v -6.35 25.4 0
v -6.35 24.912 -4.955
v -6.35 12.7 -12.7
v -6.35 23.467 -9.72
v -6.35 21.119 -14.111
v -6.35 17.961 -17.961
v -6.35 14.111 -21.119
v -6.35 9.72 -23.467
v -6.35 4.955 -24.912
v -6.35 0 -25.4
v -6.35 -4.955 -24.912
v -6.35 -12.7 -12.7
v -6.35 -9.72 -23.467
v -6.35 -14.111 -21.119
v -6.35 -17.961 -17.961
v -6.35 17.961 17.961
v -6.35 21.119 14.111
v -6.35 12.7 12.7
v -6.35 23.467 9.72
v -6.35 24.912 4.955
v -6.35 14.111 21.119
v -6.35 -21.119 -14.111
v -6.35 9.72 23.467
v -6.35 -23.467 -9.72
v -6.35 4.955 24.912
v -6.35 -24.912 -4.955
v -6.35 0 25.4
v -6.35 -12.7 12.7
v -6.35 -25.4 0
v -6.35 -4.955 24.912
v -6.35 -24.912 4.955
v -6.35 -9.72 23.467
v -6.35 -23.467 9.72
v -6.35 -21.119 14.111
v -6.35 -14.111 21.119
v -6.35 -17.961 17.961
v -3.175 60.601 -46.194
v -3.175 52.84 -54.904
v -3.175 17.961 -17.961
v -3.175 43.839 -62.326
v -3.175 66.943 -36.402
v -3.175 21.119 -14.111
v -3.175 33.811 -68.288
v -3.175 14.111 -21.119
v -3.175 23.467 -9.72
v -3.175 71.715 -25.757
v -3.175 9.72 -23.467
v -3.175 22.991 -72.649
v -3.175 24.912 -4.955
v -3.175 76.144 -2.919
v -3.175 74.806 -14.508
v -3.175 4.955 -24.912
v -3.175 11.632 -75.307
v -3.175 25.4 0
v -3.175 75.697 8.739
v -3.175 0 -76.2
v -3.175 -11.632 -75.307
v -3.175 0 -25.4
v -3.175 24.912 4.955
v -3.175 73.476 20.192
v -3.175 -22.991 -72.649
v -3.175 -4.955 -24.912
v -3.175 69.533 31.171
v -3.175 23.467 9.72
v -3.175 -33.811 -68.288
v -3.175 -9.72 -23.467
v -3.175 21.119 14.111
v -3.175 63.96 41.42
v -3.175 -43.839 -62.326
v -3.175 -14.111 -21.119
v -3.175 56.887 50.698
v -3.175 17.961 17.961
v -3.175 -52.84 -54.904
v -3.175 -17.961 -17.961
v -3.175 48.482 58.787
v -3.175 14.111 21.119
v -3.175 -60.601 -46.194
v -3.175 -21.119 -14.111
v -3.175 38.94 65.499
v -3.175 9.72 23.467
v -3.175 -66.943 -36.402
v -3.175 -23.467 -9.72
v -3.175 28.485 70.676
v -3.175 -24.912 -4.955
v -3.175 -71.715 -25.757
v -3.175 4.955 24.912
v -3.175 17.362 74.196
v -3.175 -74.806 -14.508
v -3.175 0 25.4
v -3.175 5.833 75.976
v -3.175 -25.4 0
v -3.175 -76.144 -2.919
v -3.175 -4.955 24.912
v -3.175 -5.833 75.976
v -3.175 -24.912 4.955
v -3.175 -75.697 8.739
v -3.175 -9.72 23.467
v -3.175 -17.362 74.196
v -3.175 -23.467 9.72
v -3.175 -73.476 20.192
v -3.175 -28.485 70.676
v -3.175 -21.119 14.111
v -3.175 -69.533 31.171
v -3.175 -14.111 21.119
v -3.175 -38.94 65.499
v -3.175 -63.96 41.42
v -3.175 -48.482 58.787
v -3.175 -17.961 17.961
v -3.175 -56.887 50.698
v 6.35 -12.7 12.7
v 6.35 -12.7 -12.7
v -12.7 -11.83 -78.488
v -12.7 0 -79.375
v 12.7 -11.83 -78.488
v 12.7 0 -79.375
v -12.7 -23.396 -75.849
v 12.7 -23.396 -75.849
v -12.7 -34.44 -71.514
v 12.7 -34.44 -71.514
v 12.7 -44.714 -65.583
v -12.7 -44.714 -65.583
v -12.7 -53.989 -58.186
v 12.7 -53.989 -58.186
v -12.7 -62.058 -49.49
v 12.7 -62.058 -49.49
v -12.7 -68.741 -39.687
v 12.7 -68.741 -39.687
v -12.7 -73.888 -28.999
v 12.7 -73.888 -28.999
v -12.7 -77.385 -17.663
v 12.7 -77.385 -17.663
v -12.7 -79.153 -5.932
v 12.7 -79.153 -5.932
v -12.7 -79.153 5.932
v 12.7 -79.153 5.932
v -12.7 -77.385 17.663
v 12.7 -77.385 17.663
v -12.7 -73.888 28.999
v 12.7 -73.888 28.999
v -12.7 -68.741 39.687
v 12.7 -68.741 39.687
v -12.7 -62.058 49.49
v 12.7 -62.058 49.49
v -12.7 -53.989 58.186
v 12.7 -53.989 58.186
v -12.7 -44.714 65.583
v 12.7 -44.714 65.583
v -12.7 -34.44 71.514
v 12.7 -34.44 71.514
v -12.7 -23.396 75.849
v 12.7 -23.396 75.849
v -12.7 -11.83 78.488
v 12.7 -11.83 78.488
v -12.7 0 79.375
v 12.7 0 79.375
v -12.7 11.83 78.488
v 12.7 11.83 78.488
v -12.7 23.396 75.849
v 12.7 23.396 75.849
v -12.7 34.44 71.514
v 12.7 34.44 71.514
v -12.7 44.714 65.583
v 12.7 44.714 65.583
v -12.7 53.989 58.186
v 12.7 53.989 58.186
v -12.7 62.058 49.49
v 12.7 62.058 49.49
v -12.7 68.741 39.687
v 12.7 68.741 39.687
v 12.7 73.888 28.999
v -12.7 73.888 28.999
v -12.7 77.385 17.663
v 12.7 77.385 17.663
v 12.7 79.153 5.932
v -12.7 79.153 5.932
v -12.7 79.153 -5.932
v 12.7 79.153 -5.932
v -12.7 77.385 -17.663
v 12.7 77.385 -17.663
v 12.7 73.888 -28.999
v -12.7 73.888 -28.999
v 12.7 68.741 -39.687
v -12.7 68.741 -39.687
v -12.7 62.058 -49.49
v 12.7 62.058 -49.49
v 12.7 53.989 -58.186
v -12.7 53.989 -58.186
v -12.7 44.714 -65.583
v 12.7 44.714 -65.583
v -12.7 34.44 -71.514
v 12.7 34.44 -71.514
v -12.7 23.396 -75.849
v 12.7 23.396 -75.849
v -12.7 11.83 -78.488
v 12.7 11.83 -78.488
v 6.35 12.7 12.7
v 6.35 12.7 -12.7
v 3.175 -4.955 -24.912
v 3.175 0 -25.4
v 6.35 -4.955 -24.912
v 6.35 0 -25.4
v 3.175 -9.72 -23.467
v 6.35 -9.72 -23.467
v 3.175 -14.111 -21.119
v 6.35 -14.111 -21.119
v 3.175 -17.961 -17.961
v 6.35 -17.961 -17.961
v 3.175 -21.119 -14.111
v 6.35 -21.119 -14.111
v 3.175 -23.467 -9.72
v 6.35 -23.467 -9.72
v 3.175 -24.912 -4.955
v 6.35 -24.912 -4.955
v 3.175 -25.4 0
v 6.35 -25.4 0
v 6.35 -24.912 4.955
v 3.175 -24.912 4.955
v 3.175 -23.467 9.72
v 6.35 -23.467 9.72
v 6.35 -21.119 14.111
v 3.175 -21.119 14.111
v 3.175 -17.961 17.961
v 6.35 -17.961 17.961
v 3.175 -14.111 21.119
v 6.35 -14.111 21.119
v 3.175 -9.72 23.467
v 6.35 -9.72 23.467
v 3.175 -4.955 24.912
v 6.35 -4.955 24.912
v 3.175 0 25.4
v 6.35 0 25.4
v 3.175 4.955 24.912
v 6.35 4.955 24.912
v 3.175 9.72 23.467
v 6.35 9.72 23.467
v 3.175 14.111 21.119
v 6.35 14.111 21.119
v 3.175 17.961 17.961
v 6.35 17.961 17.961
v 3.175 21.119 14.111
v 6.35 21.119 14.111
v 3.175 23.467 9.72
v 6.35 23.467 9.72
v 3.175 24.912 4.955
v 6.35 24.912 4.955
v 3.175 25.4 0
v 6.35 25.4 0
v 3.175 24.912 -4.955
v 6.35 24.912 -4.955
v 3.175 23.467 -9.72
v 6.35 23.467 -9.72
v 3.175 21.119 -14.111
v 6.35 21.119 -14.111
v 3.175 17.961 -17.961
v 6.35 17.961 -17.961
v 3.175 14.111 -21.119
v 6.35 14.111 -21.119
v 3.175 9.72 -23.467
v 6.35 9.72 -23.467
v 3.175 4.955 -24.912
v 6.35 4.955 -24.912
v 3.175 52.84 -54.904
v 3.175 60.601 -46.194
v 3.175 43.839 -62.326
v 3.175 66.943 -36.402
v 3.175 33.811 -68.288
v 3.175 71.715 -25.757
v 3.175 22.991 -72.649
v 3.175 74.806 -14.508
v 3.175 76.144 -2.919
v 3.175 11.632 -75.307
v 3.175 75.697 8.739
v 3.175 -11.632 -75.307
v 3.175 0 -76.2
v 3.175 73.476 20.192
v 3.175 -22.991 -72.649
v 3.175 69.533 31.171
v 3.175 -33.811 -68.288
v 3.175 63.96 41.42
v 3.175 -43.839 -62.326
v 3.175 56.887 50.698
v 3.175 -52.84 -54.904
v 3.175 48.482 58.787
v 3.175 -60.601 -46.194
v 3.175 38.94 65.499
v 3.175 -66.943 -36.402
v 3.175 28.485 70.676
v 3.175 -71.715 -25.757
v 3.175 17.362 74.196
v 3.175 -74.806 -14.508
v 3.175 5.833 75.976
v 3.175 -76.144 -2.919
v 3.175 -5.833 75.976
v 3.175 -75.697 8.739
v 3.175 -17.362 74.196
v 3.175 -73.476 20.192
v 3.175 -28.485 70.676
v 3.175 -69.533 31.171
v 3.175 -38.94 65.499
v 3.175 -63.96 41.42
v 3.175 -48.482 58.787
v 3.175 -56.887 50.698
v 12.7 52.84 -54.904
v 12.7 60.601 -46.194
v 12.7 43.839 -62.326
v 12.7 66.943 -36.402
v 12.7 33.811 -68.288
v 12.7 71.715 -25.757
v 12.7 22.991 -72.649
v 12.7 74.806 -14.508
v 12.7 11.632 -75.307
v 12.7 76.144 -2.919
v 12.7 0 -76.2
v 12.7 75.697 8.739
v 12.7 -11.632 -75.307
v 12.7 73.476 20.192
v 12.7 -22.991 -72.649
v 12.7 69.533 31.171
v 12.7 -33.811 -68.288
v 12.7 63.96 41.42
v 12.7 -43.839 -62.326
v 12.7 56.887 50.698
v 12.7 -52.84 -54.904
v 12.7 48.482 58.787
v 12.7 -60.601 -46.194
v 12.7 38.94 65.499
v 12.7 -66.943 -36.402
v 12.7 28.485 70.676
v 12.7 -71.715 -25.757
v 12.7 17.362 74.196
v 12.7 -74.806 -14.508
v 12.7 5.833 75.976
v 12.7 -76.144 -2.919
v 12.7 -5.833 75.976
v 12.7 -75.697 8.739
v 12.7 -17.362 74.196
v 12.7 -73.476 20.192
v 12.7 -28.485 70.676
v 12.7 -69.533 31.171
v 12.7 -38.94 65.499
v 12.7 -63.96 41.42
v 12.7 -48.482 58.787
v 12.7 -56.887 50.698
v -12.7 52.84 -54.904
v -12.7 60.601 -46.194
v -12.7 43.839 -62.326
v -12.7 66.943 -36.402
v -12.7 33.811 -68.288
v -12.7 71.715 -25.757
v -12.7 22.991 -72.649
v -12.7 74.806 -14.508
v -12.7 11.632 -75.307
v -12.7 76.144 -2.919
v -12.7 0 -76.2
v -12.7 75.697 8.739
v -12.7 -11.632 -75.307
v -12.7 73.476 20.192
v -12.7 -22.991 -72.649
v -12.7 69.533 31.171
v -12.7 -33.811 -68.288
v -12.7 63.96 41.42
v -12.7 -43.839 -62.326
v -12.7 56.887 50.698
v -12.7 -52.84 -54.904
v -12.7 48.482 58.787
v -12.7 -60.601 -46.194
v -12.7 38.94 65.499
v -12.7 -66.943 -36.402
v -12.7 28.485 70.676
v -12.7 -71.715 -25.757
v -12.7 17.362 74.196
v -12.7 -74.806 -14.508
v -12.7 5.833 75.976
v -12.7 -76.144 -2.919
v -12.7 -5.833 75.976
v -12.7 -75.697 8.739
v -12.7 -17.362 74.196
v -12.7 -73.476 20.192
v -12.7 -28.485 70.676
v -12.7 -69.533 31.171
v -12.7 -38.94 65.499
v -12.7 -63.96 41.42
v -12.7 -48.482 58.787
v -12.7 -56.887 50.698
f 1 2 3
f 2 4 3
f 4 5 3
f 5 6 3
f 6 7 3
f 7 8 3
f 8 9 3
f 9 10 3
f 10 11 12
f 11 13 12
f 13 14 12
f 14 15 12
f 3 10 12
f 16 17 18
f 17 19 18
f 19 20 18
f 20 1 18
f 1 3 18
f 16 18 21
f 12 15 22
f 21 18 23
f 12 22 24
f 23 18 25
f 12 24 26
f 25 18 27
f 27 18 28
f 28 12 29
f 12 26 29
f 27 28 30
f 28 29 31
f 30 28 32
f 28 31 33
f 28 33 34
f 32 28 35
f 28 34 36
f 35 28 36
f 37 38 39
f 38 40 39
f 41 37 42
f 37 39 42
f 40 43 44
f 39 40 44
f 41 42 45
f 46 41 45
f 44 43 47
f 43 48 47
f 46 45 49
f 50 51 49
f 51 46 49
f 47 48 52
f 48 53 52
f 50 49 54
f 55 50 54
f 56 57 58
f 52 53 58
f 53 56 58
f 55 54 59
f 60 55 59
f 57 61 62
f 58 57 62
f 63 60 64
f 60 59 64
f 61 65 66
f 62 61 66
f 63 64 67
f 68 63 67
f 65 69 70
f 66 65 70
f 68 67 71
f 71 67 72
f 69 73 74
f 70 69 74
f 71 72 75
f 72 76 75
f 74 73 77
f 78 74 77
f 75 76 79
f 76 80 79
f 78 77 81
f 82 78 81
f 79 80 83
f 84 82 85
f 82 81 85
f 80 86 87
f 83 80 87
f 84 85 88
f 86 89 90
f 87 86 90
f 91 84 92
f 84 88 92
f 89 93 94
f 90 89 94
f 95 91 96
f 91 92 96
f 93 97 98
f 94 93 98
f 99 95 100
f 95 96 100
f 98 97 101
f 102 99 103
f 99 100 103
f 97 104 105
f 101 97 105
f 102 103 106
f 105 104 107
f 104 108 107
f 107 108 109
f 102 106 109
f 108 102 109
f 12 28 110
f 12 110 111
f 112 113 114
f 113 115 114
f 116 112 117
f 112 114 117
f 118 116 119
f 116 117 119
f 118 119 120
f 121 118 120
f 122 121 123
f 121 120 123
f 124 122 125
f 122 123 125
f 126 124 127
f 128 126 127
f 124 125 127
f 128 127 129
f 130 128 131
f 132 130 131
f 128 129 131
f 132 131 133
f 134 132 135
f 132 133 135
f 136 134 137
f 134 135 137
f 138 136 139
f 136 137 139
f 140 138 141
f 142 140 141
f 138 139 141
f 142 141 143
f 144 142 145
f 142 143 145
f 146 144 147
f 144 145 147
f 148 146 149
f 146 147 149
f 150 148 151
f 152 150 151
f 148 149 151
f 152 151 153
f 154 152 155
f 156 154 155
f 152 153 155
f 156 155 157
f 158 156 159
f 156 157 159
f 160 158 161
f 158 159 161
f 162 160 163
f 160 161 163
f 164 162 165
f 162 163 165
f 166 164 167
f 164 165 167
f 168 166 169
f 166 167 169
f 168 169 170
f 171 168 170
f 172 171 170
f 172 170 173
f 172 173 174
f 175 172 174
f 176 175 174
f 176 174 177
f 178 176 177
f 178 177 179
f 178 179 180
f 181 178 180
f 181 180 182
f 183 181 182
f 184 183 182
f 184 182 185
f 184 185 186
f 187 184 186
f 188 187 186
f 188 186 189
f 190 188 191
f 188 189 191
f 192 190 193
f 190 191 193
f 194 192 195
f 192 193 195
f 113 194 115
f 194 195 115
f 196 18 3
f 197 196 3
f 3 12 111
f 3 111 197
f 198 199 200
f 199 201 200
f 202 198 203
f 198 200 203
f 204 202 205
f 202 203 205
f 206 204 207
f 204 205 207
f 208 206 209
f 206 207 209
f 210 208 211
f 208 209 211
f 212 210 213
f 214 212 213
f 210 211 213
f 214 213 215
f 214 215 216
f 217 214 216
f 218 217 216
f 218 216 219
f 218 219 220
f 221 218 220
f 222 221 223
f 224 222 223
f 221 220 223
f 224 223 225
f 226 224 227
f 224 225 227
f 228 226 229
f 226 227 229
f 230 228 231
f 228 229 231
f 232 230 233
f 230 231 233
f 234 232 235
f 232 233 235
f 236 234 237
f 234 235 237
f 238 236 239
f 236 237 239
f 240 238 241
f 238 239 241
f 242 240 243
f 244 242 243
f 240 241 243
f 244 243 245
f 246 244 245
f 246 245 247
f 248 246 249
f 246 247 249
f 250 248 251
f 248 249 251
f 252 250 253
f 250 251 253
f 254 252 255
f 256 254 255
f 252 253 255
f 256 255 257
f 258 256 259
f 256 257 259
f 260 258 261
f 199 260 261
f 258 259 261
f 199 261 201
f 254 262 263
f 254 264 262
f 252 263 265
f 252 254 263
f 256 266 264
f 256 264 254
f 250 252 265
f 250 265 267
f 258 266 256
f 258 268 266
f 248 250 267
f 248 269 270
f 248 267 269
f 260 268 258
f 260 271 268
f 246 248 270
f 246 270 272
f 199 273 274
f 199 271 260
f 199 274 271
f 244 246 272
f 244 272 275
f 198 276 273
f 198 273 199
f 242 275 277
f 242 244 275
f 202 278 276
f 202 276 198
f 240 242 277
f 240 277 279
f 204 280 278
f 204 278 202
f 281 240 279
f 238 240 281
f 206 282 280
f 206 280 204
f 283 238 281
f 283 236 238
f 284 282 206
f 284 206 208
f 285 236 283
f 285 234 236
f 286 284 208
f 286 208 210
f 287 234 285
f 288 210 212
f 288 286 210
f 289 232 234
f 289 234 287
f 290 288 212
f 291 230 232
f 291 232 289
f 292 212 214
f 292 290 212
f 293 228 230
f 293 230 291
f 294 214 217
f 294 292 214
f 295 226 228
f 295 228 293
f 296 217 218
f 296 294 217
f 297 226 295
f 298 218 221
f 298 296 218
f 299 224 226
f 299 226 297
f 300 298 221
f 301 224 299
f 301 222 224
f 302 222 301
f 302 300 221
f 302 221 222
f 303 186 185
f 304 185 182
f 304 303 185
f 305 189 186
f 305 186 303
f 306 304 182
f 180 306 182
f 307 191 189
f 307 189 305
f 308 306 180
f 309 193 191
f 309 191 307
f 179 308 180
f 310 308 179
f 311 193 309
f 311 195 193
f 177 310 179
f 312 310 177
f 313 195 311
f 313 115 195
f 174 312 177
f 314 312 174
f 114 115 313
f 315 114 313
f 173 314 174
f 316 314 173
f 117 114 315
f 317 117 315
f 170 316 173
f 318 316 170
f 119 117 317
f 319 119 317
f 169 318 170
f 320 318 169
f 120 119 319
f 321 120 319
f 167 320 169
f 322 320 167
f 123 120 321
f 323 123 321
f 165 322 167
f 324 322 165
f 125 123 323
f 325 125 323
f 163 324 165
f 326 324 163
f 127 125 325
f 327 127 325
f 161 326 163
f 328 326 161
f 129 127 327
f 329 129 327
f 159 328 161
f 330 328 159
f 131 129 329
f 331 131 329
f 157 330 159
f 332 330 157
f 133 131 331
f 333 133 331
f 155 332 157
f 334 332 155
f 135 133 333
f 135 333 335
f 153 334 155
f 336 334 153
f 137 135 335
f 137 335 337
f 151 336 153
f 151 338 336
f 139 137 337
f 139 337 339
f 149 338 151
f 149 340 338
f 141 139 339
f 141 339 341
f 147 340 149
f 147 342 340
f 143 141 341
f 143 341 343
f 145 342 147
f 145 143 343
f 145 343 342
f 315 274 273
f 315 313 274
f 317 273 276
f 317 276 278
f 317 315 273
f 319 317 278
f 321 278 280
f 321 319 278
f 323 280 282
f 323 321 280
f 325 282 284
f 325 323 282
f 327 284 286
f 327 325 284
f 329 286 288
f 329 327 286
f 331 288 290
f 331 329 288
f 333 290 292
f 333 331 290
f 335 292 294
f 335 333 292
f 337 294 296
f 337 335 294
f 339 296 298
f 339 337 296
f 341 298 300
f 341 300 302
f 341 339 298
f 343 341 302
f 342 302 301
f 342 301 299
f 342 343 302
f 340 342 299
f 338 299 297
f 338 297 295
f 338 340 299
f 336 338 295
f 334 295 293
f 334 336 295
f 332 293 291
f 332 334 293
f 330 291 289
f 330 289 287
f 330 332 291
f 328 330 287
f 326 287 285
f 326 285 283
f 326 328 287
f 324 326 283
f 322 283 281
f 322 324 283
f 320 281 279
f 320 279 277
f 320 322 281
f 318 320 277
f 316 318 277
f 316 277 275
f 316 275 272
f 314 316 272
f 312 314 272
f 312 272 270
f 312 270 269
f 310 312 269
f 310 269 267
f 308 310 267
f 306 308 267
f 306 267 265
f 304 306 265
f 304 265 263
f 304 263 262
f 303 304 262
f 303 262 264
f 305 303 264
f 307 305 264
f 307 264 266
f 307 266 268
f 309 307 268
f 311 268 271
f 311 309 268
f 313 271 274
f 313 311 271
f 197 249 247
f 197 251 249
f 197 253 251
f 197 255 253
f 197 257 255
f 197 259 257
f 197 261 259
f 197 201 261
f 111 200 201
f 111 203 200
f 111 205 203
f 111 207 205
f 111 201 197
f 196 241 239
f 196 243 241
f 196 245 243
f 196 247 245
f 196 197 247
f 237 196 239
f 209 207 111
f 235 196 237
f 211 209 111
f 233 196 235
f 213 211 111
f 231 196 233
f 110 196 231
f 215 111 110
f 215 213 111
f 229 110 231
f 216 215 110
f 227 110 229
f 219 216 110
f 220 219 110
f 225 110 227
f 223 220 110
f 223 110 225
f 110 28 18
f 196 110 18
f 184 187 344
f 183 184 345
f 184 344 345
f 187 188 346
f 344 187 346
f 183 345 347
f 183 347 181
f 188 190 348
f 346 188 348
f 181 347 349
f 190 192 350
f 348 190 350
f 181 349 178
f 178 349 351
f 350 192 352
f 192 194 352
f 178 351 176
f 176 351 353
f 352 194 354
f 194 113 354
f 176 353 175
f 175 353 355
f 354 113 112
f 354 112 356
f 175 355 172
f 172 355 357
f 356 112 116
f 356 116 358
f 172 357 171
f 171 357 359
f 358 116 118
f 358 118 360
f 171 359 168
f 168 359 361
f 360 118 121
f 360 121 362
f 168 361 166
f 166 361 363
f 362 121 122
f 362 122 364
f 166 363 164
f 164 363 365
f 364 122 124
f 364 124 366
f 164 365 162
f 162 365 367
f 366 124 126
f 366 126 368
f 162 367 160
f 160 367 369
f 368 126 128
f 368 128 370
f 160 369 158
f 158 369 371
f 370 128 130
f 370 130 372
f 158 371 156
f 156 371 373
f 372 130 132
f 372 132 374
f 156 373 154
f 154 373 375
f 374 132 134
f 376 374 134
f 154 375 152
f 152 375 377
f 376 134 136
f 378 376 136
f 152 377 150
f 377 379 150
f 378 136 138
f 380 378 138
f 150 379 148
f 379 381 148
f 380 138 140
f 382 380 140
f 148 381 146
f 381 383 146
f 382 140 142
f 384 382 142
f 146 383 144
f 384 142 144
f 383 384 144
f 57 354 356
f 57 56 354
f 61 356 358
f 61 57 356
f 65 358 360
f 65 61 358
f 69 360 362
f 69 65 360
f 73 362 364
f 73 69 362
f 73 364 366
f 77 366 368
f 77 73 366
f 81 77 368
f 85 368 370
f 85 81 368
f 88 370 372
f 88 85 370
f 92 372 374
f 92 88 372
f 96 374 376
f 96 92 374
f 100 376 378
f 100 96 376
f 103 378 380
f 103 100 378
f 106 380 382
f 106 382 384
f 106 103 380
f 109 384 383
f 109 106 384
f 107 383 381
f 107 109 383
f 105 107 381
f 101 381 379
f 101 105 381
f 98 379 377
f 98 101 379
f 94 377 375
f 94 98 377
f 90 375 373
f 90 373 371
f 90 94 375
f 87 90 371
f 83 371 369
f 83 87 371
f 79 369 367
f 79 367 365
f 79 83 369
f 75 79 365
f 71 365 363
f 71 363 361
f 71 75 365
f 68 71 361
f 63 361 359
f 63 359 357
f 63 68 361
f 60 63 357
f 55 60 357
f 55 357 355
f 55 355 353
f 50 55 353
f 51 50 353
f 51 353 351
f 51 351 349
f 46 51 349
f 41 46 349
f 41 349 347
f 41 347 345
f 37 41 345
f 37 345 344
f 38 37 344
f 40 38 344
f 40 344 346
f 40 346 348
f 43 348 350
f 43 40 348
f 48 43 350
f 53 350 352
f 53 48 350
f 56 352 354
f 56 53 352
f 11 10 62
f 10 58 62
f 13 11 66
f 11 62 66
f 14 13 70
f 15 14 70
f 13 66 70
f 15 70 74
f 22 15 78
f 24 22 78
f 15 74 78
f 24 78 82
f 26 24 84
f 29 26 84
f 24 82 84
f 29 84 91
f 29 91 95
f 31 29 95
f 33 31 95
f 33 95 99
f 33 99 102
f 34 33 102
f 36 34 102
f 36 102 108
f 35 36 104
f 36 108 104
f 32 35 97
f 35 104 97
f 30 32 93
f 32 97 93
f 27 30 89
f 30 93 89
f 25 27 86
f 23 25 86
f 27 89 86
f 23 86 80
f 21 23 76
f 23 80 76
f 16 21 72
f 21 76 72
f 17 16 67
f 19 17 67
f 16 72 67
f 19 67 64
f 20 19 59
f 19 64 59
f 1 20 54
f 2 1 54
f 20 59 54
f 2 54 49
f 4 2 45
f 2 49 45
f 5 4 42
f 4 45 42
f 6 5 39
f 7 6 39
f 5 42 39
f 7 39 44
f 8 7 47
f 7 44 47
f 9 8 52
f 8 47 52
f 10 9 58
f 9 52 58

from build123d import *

# Parameters (mm, degrees)
SKETCH1_W               = 6.35
SKETCH1_H               = 50.8
SKETCH1_W_2             = 12.7
SKETCH1_H_2             = 25.4
SKETCH1_W_3             = 25.4
SKETCH1_H_3             = 3.175
CUT_EXTRUDE1_DEPTH      = 114.858173839
CUT_EXTRUDE1_DEPTH_BACK = 114.858173839
SKETCH2_W               = 25.4
SKETCH2_H               = 25.4


with BuildPart() as part:
    # Sketch1 → Revolve1 (revolve)
    with BuildSketch(Plane(origin=(0, 0, 0), x_dir=(1, 0, 0), z_dir=(0, 1, 0))):
        with Locations((0, 50.8)):
            Rectangle(SKETCH1_W, SKETCH1_H)
        with Locations((0, 12.7)):
            Rectangle(SKETCH1_W_2, SKETCH1_H_2)
        with Locations((0, 77.7875)):
            Rectangle(SKETCH1_W_3, SKETCH1_H_3)
    revolve(axis=Axis((6.35, 0, 0), (-1, 0, 0)))

    # Sketch2 → Cut-Extrude1 (cut, two sides: drawn at the far end of the back side and taken through both)
    with BuildSketch(Plane(origin=(6.35, 0, 0), x_dir=(0, 0, -1), z_dir=(1, 0, 0)).offset(-CUT_EXTRUDE1_DEPTH_BACK)):
        Rectangle(SKETCH2_W, SKETCH2_H)
    extrude(amount=CUT_EXTRUDE1_DEPTH + CUT_EXTRUDE1_DEPTH_BACK, mode=Mode.SUBTRACT)


solid = part.part
